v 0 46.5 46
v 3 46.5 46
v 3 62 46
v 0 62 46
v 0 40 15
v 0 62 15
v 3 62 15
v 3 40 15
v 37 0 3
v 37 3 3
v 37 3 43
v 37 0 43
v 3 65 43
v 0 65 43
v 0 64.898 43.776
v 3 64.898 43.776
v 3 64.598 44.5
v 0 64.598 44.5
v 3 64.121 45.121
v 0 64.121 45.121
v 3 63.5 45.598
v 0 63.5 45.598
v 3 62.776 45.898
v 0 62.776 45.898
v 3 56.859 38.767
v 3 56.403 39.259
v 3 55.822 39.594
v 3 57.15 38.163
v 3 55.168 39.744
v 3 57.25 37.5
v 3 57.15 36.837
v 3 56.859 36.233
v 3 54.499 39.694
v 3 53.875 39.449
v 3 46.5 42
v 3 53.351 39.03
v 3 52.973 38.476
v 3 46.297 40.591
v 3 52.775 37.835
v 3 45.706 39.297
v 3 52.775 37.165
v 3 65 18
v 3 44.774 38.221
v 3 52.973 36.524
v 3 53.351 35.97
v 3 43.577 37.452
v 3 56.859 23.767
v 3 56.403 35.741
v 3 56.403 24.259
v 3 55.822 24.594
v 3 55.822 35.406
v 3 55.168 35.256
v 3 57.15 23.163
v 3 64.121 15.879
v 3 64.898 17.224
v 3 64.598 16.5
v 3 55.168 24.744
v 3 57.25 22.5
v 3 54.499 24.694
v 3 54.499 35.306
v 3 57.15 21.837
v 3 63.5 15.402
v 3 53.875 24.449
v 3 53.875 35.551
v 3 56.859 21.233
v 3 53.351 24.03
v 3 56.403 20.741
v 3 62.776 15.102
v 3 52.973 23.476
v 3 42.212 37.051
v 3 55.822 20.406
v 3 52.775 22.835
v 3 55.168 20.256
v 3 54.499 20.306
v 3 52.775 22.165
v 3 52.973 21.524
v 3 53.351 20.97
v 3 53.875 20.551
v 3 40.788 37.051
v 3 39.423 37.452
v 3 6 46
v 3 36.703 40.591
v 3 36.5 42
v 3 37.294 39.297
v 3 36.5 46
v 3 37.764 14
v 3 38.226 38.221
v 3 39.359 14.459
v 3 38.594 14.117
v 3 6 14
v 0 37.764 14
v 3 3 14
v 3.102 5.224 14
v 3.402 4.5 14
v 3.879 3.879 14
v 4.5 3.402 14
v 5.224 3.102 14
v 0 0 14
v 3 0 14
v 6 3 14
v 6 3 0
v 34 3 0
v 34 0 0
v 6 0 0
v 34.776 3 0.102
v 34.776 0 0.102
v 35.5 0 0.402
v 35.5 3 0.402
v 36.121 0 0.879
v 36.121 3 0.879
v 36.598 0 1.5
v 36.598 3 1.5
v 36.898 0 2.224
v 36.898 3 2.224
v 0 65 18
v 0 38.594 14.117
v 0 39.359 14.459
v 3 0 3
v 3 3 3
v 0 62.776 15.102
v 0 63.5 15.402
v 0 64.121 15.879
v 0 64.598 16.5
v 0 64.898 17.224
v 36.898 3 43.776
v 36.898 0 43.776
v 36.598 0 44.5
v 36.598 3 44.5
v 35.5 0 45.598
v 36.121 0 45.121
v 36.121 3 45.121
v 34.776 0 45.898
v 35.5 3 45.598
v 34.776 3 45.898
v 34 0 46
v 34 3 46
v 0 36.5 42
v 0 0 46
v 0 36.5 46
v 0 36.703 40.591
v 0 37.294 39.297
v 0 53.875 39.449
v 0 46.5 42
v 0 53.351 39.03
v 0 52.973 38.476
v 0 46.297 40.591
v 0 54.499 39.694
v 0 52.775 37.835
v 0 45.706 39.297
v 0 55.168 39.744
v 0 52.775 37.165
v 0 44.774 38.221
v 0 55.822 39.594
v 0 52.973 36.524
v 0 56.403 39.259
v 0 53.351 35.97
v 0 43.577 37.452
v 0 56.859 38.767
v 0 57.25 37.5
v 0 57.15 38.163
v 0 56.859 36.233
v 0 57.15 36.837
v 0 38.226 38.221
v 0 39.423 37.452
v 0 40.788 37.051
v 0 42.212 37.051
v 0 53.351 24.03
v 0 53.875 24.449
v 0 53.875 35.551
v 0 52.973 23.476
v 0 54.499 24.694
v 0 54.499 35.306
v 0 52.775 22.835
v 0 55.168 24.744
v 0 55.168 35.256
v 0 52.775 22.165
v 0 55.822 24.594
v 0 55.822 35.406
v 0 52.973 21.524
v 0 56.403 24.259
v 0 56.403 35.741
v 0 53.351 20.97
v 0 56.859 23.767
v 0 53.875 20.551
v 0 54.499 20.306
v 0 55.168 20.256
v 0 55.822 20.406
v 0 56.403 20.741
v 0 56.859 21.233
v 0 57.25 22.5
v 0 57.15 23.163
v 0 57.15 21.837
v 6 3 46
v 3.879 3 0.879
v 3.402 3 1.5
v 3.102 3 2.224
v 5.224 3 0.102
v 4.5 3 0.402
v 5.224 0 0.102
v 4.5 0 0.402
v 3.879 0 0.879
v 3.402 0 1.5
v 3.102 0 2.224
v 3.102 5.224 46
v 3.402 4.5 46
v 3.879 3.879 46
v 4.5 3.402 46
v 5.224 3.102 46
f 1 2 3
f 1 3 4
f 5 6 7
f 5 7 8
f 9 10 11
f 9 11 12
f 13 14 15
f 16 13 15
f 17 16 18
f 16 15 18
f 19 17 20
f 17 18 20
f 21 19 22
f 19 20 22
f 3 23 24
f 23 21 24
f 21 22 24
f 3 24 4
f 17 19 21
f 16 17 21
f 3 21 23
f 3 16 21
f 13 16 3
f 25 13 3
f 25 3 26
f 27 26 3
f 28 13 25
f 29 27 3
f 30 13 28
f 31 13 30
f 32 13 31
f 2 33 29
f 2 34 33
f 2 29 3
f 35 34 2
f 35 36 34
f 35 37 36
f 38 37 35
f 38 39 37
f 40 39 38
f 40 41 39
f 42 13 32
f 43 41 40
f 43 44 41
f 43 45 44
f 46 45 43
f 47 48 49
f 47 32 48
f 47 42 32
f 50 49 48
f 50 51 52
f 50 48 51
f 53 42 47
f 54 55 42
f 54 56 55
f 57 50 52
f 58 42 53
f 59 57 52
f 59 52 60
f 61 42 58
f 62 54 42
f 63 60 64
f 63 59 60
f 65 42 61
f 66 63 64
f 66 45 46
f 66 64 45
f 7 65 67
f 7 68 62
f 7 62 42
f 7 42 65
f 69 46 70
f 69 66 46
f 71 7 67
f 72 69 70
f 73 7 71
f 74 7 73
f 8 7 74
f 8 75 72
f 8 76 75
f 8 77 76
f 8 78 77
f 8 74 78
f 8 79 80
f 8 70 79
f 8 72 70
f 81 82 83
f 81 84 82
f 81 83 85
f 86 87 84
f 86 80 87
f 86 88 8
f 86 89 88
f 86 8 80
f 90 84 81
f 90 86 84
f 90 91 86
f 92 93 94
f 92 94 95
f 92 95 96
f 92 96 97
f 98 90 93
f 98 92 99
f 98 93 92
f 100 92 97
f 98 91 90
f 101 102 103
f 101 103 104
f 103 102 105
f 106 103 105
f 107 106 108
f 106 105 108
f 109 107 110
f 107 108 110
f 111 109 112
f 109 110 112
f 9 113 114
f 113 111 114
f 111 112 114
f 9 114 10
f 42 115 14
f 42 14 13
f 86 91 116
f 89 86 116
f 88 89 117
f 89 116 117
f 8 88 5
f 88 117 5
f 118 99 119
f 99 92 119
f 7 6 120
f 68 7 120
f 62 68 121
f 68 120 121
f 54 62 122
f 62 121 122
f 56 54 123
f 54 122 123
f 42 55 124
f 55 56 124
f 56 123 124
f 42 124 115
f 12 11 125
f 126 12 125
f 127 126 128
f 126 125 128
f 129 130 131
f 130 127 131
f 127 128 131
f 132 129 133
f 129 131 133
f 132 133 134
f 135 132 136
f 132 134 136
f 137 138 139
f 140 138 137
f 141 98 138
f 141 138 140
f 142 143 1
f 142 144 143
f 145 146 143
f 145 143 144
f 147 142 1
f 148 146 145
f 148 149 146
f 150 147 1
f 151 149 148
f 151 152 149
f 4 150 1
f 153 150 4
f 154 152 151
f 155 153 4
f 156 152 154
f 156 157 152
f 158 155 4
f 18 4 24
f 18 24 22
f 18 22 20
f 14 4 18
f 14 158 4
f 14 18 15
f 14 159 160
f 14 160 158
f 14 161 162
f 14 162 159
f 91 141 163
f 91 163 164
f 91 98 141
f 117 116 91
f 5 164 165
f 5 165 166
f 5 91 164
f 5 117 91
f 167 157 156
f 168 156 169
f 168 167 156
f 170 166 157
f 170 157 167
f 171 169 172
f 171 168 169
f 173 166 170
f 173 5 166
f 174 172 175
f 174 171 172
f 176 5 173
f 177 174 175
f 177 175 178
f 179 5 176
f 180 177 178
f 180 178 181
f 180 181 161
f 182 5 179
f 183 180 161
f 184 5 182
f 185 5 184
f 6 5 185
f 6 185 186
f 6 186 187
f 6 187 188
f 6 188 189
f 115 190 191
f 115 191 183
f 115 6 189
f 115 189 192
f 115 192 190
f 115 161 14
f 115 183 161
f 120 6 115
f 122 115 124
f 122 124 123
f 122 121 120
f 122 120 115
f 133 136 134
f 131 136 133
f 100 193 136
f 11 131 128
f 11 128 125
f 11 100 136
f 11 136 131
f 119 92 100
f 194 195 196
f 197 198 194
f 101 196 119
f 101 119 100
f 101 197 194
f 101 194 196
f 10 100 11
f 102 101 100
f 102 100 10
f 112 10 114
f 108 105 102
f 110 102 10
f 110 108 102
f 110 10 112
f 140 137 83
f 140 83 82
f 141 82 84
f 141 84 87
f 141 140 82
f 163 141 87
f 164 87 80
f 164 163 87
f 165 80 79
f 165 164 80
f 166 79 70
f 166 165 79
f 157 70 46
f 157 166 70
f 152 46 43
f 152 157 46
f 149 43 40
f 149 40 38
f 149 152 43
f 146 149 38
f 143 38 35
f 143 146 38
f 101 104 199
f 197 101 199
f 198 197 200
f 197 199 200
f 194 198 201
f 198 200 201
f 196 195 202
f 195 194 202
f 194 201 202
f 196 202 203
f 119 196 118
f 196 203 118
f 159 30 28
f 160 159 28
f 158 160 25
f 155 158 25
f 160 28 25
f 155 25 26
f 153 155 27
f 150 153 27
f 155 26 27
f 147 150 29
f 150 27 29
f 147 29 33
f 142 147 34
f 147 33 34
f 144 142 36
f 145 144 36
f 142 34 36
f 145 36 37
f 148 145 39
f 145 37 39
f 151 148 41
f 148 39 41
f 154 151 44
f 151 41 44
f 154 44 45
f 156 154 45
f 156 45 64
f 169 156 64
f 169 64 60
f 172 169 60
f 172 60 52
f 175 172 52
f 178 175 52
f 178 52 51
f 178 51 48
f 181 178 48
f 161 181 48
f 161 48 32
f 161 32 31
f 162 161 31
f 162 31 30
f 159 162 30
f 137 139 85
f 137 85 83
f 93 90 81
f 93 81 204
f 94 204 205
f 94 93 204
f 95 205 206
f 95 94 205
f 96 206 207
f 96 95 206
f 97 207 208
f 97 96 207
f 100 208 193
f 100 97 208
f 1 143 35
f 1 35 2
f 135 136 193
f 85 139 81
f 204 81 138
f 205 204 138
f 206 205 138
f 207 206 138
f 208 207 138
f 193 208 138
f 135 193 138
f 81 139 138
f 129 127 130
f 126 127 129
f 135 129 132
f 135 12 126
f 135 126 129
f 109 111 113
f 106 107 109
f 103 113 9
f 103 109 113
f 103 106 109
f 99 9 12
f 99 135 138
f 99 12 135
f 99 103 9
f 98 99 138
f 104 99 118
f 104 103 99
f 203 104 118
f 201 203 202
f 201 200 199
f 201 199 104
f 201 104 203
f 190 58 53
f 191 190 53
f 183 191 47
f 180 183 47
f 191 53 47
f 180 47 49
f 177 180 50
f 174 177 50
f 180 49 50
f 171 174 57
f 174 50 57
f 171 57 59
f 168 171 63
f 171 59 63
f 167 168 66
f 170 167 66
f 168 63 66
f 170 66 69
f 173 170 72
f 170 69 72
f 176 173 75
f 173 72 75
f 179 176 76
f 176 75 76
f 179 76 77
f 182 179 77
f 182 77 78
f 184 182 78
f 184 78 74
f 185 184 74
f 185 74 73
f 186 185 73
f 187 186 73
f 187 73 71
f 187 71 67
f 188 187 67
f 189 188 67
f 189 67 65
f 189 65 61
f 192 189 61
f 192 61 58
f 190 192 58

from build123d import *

# Parameters (mm, degrees)
BOSS_EXTRUDE1_DEPTH = 46
CUT_EXTRUDE1_DEPTH  = 3
SKETCH3_R           = 2.25
CUT_EXTRUDE2_DEPTH  = 46
FILLET1_R           = 3


with BuildPart() as part:
    # Sketch1 → Boss-Extrude1 (new body)
    with BuildSketch(Plane.XY):
        Polygon((0, 0), (0, 65), (3, 65), (3, 3), (37, 3), (37, 0), align=None)
    extrude(amount=BOSS_EXTRUDE1_DEPTH)

    # Sketch2 → Cut-Extrude1 (cut)
    with BuildSketch(Plane.ZY):
        Polygon((0, 65), (14, 65), (15, 65), (15, 40), (14, 40), (14, 0), (0, 0), align=None)
        with BuildLine():
            Line((42, 46.5), (46, 46.5))
            Line((46, 46.5), (46, 36.5))
            Line((46, 36.5), (42, 36.5))
            ThreePointArc((42, 36.5), (37, 41.5), (42, 46.5))
        make_face()
    extrude(amount=-CUT_EXTRUDE1_DEPTH, mode=Mode.SUBTRACT)

    # Sketch3 → Cut-Extrude2 (cut)
    with BuildSketch(Plane(origin=(3, 0, 0), x_dir=(0, 0, -1), z_dir=(1, 0, 0))):
        with Locations(Location((-37.5, 55, 0), (0, 0, 90))):
            Circle(SKETCH3_R)
        with Locations(Location((-22.5, 55, 0), (0, 0, 90))):
            Circle(SKETCH3_R)
    extrude(amount=-CUT_EXTRUDE2_DEPTH, mode=Mode.SUBTRACT)

    # Fillet1
    # the kernel refuses this fillet: 3 mm, written as the material it adds along each edge
    with BuildSketch(Plane(origin=(3, 3, 14), x_dir=(0, 1, 0), z_dir=(0, 0, 1))) as fillet1_piece_1:
        with BuildLine():
            CenterArc((FILLET1_R, -FILLET1_R), FILLET1_R, 90, 90)
            Line((0, -FILLET1_R), (0, 0))
            Line((0, 0), (FILLET1_R, 0))
        make_face()
    extrude(amount=32)
    # the kernel refuses this fillet: 3 mm, written as the material it takes off along each edge
    with BuildSketch(Plane(origin=(-5.590169944, 40, 14), x_dir=(0, -1, 0), z_dir=(1, 0, 0))) as fillet1_2_piece_1:
        with BuildLine():
            CenterArc((2.236067977, -3), FILLET1_R, 90, 48.189685104)
            Line((0, -1), (0, 0))
            Line((0, 0), (2.236067977, 0))
        make_face()
    extrude(amount=14.180339887, mode=Mode.SUBTRACT)
    with BuildSketch(Plane(origin=(37, 10.5, 46), x_dir=(-1, 0, 0), z_dir=(0, -1, 0)), Plane(origin=(3, -7.5, 0), x_dir=(0, 0, 1), z_dir=(0, 1, 0))) as fillet1_2_piece_2:
        with BuildLine():
            CenterArc((FILLET1_R, FILLET1_R), FILLET1_R, 180, 90)
            Line((0, FILLET1_R), (0, 0))
            Line((0, 0), (FILLET1_R, 0))
        make_face()
    extrude(amount=18, mode=Mode.SUBTRACT)
    with BuildSketch(Plane(origin=(37, 10.5, 0), x_dir=(-1, 0, 0), z_dir=(0, -1, 0)), Plane(origin=(-7.5, 65, 46), x_dir=(0, 0, -1), z_dir=(1, 0, 0)), Plane(origin=(-7.5, 65, 15), x_dir=(0, -1, 0), z_dir=(1, 0, 0))) as fillet1_2_piece_3:
        with BuildLine():
            CenterArc((FILLET1_R, -FILLET1_R), FILLET1_R, 90, 90)
            Line((0, -FILLET1_R), (0, 0))
            Line((0, 0), (FILLET1_R, 0))
        make_face()
    extrude(amount=18, mode=Mode.SUBTRACT)


solid = part.part
